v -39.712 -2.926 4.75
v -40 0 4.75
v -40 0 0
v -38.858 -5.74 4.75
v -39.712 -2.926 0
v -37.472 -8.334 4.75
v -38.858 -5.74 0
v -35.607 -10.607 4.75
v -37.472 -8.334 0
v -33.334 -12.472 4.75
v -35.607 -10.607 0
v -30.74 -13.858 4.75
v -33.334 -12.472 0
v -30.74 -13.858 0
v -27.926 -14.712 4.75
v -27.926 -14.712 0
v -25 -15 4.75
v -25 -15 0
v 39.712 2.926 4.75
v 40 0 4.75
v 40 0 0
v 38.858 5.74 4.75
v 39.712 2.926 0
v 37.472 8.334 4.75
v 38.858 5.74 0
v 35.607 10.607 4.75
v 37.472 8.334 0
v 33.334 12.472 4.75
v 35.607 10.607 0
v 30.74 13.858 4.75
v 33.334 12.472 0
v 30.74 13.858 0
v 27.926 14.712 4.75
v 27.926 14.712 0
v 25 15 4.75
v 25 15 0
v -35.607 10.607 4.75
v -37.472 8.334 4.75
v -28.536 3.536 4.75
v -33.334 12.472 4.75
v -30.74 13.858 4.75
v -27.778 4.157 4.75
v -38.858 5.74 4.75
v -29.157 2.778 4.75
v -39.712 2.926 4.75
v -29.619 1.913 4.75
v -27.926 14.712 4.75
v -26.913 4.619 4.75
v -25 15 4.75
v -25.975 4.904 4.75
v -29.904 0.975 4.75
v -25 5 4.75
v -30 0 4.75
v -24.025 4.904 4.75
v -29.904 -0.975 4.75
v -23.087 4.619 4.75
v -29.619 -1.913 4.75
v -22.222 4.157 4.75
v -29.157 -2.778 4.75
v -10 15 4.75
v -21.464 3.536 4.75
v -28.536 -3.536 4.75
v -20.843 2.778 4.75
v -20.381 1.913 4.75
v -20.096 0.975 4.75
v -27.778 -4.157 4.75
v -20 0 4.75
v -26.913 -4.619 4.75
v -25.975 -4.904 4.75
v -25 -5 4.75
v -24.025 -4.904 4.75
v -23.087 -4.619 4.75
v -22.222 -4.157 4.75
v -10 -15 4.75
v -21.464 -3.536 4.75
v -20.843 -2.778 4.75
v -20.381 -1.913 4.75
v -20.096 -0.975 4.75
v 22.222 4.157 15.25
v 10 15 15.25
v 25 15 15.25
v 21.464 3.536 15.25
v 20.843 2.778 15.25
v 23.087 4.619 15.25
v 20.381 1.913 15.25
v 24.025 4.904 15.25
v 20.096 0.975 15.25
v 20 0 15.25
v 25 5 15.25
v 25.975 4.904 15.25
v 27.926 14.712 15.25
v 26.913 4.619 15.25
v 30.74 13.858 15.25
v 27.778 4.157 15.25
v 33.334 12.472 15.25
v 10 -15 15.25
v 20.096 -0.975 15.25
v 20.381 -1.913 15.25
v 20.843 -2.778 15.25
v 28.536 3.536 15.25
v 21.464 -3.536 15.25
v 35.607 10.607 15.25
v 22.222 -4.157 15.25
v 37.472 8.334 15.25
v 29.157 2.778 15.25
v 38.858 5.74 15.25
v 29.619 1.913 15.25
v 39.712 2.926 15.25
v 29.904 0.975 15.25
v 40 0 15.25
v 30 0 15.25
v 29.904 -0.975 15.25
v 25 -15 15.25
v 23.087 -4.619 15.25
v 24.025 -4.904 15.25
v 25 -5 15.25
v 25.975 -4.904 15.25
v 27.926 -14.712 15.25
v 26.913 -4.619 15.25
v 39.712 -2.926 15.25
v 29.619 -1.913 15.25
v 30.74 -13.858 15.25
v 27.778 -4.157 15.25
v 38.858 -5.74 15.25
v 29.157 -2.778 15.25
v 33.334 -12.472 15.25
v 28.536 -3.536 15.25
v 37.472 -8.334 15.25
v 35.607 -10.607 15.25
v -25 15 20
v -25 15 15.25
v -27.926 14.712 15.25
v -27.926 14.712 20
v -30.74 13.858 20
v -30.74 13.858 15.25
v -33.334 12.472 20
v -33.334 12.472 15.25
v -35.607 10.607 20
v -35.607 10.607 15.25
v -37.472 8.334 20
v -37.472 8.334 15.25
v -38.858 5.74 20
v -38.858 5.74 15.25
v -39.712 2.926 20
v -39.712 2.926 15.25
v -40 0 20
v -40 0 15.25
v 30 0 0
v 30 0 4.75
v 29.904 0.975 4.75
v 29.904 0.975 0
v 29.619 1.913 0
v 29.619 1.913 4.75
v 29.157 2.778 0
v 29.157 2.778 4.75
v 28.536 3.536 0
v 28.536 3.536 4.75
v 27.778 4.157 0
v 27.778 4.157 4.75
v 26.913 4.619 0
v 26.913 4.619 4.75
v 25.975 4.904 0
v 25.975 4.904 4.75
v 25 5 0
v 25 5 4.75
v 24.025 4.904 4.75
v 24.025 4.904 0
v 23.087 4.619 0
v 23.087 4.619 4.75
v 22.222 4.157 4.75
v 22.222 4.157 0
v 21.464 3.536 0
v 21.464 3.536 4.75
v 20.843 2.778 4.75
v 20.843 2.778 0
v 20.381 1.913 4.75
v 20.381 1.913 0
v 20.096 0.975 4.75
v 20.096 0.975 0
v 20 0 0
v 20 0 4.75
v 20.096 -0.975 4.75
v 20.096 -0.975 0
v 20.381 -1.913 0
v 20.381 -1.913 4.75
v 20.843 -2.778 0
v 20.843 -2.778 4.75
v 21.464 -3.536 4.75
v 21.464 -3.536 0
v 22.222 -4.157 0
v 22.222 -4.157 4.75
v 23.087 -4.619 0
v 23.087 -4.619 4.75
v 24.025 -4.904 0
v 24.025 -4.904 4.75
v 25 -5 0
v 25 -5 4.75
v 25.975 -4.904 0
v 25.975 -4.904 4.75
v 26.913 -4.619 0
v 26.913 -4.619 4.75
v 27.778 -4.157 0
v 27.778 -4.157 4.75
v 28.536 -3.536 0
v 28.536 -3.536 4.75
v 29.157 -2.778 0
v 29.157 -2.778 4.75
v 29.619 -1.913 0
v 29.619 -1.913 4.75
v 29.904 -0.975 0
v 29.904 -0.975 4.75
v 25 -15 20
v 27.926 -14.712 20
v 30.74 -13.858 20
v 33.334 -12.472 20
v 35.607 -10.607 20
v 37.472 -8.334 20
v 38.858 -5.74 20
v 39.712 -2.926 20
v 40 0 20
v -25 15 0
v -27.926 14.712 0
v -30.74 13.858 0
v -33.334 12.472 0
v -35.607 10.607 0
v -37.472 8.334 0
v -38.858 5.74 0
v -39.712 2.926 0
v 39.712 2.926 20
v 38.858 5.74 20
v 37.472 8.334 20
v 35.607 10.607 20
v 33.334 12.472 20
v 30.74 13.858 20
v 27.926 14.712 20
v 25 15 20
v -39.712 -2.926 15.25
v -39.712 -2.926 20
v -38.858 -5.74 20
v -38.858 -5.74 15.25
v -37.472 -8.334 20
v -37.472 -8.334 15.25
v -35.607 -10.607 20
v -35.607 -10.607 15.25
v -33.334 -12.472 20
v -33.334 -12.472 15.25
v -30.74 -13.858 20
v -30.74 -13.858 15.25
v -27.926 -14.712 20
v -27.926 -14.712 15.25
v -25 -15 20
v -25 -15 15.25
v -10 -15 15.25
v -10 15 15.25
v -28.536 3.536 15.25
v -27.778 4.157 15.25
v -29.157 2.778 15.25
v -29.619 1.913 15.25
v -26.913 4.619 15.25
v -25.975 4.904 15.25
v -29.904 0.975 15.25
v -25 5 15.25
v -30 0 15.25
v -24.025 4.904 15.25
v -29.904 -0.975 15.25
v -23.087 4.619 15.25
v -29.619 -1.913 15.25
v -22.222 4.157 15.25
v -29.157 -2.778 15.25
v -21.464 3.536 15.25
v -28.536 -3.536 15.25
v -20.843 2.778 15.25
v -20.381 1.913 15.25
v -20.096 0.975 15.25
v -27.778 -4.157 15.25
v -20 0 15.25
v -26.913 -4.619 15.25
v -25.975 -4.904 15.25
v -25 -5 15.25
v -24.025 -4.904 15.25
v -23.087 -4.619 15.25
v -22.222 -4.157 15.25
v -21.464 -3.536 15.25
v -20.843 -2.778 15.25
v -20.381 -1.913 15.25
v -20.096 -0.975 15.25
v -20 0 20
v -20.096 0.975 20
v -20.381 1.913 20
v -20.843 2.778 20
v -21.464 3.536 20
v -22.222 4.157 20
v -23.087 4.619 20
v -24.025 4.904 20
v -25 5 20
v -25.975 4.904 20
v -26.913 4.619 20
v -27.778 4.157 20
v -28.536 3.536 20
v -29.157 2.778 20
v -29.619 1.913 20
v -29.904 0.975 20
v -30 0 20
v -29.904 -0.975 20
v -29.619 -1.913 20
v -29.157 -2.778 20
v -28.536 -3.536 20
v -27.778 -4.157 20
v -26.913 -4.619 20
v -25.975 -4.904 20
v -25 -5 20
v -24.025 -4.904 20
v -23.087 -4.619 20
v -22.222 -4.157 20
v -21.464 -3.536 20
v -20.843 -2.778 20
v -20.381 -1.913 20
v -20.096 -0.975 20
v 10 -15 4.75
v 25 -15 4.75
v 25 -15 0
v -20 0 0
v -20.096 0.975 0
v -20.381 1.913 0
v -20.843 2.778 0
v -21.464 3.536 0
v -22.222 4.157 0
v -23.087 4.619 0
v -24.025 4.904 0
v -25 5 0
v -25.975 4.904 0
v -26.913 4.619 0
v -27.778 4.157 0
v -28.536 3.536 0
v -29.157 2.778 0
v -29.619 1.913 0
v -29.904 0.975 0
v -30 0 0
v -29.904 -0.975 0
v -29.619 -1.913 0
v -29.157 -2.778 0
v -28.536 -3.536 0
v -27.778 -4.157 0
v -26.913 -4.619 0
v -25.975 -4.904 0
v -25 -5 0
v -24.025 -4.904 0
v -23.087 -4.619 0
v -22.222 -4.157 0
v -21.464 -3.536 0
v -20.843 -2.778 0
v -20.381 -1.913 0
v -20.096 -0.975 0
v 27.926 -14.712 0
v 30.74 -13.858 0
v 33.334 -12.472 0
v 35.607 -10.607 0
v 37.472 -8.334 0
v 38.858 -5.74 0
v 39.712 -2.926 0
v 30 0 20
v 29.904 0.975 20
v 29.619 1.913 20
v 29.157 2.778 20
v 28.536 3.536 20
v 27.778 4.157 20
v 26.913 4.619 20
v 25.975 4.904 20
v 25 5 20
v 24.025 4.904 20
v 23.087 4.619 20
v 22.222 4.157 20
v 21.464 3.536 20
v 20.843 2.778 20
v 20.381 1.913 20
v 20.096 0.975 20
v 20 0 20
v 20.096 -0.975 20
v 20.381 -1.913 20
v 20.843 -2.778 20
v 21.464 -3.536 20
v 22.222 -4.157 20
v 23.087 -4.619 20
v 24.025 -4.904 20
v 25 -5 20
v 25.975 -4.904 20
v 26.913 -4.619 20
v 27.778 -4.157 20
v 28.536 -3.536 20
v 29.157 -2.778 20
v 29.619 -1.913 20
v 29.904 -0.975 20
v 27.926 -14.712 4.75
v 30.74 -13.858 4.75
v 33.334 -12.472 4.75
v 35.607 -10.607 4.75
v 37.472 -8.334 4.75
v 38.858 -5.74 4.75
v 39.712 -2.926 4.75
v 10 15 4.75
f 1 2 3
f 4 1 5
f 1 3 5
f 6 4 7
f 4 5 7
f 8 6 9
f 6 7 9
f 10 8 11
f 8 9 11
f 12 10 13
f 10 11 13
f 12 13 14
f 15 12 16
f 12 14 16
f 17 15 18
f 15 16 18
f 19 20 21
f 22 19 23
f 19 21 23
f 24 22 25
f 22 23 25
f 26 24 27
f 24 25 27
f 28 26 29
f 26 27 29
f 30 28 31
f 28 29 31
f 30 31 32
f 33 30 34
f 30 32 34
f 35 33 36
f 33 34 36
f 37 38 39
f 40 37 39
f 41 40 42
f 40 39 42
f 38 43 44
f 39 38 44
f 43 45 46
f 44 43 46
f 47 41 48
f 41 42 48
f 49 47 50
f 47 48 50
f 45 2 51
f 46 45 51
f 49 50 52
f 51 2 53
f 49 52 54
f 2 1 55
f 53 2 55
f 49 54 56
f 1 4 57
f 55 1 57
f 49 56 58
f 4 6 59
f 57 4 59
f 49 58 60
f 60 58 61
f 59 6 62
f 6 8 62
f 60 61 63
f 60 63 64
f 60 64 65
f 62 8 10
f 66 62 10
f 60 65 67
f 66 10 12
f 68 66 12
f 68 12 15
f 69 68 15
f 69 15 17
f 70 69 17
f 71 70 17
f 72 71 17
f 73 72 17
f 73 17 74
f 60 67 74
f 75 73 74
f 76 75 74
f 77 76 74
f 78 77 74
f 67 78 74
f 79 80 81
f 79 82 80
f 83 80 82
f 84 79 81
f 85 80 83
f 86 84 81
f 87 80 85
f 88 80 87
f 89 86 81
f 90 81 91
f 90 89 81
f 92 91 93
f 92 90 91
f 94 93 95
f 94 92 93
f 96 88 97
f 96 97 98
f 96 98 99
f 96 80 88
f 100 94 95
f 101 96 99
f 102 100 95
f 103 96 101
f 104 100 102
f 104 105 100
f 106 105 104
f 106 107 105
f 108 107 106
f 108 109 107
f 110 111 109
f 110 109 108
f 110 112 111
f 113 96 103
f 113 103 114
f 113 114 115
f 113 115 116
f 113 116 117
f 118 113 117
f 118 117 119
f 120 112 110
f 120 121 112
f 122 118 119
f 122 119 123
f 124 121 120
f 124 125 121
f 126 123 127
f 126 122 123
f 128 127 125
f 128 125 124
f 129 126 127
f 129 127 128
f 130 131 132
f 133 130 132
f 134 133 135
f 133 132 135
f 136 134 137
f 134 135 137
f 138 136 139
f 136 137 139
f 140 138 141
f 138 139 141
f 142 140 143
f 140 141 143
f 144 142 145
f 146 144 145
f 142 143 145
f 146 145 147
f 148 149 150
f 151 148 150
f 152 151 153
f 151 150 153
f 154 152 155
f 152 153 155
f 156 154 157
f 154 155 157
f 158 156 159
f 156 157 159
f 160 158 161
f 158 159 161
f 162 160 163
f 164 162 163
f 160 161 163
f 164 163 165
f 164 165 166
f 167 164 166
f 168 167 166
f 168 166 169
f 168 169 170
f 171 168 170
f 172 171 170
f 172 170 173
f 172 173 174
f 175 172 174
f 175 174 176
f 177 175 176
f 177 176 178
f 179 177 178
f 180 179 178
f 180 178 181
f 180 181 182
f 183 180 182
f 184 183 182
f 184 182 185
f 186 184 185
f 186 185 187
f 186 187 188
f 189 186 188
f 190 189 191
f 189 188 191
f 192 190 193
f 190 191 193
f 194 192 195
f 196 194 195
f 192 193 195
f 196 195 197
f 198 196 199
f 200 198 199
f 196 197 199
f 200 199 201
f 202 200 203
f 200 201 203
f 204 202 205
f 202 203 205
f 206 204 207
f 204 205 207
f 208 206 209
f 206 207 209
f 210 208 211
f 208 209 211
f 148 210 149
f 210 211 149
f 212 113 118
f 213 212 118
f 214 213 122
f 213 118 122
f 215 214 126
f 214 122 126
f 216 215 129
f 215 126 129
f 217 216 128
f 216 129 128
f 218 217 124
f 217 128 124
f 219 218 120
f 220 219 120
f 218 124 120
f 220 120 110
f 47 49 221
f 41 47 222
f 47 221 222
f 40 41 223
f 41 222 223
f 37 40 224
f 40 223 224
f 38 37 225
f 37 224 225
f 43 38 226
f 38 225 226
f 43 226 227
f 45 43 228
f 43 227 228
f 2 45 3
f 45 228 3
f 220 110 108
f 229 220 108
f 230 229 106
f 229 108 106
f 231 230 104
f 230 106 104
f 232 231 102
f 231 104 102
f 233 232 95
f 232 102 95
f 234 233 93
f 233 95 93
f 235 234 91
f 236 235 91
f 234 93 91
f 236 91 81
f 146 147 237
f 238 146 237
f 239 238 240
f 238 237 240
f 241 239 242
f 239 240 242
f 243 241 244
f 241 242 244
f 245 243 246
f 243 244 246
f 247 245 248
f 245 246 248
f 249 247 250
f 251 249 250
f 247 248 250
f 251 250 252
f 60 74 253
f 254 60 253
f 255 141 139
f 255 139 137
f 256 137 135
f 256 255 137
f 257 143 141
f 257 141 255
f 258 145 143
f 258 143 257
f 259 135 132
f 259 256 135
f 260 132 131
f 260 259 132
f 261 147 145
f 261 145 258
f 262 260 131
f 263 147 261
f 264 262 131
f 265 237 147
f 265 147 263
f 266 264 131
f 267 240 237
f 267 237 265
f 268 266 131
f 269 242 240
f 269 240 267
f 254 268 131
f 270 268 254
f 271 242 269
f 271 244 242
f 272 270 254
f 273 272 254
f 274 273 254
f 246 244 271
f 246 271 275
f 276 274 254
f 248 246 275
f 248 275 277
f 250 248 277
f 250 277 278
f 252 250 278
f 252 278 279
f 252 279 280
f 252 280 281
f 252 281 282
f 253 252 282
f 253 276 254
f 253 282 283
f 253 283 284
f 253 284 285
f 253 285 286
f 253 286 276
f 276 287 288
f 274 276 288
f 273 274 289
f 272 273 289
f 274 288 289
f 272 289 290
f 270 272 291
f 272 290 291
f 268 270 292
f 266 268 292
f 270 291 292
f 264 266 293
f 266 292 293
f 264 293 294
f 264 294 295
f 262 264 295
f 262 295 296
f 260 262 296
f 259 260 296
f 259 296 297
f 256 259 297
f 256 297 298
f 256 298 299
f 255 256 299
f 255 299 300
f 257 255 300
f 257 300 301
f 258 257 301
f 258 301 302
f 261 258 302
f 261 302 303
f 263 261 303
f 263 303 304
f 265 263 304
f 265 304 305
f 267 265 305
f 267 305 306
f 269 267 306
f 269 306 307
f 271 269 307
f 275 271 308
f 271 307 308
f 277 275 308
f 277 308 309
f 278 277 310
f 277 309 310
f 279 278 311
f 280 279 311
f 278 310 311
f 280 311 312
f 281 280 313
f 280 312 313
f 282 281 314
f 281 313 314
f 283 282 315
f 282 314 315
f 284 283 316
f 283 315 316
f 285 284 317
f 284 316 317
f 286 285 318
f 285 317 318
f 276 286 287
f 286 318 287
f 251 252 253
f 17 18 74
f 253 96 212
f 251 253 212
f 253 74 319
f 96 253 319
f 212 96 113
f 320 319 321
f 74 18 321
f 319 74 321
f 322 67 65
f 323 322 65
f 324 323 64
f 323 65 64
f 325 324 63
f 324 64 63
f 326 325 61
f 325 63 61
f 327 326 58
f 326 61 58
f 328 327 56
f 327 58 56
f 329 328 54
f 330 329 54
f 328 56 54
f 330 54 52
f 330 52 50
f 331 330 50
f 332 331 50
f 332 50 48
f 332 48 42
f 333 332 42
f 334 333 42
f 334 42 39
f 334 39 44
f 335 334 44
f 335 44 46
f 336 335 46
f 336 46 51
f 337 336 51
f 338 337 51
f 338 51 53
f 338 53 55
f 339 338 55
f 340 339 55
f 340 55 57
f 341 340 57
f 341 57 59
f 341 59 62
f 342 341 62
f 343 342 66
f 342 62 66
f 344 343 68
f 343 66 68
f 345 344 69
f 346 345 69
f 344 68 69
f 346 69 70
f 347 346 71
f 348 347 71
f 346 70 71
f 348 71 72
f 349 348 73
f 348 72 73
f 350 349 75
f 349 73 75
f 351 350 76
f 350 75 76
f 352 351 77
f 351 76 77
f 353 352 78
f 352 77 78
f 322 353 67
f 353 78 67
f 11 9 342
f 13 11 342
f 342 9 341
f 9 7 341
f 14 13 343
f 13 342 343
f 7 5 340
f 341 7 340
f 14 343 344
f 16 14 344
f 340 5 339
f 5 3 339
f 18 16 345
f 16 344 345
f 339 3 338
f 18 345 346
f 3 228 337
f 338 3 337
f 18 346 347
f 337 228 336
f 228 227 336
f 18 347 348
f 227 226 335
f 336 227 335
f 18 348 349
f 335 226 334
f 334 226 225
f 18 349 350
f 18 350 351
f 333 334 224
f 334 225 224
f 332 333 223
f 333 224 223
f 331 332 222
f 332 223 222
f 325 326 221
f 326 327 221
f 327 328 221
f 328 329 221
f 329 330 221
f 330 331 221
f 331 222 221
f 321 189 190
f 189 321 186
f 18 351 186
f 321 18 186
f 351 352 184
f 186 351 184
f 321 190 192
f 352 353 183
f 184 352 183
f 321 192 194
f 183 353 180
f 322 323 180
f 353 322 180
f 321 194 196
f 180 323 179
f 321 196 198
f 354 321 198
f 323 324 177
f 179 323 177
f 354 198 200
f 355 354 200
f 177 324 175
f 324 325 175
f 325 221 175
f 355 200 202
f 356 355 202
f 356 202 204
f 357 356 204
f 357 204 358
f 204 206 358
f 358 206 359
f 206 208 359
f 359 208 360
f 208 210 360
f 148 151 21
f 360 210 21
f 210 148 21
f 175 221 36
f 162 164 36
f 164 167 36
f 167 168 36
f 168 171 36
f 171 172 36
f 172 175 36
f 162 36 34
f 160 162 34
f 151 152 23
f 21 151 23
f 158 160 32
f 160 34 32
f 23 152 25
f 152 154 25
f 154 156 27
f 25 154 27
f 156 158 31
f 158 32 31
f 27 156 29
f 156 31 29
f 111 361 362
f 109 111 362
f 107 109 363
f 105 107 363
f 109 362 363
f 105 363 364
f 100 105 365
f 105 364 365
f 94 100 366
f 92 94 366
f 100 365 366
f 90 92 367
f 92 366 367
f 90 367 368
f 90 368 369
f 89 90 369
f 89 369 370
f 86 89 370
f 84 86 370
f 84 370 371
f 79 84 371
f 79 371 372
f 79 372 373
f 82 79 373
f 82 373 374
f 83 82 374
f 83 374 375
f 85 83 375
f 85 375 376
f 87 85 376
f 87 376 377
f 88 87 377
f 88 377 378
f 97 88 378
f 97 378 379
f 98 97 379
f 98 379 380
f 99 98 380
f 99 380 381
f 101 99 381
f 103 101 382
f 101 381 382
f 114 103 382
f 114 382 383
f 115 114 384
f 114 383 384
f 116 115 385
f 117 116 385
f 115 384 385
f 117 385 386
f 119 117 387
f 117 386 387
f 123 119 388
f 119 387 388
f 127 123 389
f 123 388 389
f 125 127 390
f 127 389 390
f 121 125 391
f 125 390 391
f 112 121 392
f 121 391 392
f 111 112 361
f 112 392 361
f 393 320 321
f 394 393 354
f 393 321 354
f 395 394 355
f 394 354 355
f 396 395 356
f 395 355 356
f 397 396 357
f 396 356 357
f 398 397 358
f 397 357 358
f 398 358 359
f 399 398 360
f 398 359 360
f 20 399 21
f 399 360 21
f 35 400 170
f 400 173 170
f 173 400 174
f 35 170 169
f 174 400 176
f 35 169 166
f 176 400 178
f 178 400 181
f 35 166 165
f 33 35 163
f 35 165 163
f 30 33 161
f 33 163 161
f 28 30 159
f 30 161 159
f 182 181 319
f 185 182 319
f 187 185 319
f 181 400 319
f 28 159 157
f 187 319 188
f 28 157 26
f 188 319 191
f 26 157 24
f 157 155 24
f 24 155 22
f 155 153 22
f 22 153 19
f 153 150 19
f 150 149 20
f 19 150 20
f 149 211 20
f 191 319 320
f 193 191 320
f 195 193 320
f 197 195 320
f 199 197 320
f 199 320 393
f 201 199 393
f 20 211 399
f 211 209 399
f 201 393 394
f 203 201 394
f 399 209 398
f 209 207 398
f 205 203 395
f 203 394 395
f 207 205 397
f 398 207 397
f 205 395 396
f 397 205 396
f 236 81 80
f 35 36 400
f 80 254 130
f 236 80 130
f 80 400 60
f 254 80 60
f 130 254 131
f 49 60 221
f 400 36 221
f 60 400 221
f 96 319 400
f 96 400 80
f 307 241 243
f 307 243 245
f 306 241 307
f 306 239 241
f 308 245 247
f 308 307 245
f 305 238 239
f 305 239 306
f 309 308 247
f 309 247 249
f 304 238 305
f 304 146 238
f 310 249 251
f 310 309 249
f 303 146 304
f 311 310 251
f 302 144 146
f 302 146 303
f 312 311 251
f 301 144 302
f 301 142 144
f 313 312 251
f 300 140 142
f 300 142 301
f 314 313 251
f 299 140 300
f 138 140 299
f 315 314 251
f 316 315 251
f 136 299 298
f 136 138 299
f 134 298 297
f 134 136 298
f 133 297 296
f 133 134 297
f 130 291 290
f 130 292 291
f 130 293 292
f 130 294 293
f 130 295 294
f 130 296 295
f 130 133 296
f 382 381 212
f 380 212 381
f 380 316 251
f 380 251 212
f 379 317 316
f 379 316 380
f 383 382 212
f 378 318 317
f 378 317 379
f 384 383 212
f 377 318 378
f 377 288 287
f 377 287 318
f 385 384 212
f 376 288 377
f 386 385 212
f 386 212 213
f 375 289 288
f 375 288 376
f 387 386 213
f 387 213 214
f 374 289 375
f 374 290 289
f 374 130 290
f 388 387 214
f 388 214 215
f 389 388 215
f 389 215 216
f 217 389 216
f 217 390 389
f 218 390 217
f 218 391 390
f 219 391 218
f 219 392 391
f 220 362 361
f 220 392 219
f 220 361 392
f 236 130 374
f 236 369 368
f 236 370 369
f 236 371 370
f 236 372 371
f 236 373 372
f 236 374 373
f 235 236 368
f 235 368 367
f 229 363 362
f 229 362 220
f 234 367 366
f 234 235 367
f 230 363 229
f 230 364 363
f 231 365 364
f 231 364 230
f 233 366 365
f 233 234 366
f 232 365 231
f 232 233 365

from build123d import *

# Parameters (mm, degrees)
F1_DEPTH = 20
F2_R     = 5
F3_DEPTH = 25
F4_W     = 30
F4_H     = 10.5
F5_DEPTH = 30


with BuildPart() as f1:
    # F0 (on Top) → F1 (new body)
    with BuildSketch(Plane.XY):
        with BuildLine():
            ThreePointArc((40, 0), (35.606602, 10.606602), (25, 15))
            Line((25, 15), (-25, 15))
            ThreePointArc((-25, 15), (-35.606602, 10.606602), (-40, 0))
            ThreePointArc((-40, 0), (-35.606602, -10.606602), (-25, -15))
            Line((-25, -15), (25, -15))
            ThreePointArc((25, -15), (35.606602, -10.606602), (40, 0))
        make_face()
    extrude(amount=F1_DEPTH)

    # F2 (on face) → F3 (cut)
    with BuildSketch(Plane.XY.offset(20)):
        with Locations((25, 0)):
            Circle(F2_R)
        with Locations((-25, 0)):
            Circle(F2_R)
    extrude(amount=-F3_DEPTH, mode=Mode.SUBTRACT)

    # F4 (on face) → F5 (cut)
    with BuildSketch(Plane.XZ.offset(15)):
        with Locations((25, 10)):
            Rectangle(F4_W, F4_H)
        with Locations((-25, 10)):
            Rectangle(F4_W, F4_H)
    extrude(amount=-F5_DEPTH, mode=Mode.SUBTRACT)


solid = f1.part
